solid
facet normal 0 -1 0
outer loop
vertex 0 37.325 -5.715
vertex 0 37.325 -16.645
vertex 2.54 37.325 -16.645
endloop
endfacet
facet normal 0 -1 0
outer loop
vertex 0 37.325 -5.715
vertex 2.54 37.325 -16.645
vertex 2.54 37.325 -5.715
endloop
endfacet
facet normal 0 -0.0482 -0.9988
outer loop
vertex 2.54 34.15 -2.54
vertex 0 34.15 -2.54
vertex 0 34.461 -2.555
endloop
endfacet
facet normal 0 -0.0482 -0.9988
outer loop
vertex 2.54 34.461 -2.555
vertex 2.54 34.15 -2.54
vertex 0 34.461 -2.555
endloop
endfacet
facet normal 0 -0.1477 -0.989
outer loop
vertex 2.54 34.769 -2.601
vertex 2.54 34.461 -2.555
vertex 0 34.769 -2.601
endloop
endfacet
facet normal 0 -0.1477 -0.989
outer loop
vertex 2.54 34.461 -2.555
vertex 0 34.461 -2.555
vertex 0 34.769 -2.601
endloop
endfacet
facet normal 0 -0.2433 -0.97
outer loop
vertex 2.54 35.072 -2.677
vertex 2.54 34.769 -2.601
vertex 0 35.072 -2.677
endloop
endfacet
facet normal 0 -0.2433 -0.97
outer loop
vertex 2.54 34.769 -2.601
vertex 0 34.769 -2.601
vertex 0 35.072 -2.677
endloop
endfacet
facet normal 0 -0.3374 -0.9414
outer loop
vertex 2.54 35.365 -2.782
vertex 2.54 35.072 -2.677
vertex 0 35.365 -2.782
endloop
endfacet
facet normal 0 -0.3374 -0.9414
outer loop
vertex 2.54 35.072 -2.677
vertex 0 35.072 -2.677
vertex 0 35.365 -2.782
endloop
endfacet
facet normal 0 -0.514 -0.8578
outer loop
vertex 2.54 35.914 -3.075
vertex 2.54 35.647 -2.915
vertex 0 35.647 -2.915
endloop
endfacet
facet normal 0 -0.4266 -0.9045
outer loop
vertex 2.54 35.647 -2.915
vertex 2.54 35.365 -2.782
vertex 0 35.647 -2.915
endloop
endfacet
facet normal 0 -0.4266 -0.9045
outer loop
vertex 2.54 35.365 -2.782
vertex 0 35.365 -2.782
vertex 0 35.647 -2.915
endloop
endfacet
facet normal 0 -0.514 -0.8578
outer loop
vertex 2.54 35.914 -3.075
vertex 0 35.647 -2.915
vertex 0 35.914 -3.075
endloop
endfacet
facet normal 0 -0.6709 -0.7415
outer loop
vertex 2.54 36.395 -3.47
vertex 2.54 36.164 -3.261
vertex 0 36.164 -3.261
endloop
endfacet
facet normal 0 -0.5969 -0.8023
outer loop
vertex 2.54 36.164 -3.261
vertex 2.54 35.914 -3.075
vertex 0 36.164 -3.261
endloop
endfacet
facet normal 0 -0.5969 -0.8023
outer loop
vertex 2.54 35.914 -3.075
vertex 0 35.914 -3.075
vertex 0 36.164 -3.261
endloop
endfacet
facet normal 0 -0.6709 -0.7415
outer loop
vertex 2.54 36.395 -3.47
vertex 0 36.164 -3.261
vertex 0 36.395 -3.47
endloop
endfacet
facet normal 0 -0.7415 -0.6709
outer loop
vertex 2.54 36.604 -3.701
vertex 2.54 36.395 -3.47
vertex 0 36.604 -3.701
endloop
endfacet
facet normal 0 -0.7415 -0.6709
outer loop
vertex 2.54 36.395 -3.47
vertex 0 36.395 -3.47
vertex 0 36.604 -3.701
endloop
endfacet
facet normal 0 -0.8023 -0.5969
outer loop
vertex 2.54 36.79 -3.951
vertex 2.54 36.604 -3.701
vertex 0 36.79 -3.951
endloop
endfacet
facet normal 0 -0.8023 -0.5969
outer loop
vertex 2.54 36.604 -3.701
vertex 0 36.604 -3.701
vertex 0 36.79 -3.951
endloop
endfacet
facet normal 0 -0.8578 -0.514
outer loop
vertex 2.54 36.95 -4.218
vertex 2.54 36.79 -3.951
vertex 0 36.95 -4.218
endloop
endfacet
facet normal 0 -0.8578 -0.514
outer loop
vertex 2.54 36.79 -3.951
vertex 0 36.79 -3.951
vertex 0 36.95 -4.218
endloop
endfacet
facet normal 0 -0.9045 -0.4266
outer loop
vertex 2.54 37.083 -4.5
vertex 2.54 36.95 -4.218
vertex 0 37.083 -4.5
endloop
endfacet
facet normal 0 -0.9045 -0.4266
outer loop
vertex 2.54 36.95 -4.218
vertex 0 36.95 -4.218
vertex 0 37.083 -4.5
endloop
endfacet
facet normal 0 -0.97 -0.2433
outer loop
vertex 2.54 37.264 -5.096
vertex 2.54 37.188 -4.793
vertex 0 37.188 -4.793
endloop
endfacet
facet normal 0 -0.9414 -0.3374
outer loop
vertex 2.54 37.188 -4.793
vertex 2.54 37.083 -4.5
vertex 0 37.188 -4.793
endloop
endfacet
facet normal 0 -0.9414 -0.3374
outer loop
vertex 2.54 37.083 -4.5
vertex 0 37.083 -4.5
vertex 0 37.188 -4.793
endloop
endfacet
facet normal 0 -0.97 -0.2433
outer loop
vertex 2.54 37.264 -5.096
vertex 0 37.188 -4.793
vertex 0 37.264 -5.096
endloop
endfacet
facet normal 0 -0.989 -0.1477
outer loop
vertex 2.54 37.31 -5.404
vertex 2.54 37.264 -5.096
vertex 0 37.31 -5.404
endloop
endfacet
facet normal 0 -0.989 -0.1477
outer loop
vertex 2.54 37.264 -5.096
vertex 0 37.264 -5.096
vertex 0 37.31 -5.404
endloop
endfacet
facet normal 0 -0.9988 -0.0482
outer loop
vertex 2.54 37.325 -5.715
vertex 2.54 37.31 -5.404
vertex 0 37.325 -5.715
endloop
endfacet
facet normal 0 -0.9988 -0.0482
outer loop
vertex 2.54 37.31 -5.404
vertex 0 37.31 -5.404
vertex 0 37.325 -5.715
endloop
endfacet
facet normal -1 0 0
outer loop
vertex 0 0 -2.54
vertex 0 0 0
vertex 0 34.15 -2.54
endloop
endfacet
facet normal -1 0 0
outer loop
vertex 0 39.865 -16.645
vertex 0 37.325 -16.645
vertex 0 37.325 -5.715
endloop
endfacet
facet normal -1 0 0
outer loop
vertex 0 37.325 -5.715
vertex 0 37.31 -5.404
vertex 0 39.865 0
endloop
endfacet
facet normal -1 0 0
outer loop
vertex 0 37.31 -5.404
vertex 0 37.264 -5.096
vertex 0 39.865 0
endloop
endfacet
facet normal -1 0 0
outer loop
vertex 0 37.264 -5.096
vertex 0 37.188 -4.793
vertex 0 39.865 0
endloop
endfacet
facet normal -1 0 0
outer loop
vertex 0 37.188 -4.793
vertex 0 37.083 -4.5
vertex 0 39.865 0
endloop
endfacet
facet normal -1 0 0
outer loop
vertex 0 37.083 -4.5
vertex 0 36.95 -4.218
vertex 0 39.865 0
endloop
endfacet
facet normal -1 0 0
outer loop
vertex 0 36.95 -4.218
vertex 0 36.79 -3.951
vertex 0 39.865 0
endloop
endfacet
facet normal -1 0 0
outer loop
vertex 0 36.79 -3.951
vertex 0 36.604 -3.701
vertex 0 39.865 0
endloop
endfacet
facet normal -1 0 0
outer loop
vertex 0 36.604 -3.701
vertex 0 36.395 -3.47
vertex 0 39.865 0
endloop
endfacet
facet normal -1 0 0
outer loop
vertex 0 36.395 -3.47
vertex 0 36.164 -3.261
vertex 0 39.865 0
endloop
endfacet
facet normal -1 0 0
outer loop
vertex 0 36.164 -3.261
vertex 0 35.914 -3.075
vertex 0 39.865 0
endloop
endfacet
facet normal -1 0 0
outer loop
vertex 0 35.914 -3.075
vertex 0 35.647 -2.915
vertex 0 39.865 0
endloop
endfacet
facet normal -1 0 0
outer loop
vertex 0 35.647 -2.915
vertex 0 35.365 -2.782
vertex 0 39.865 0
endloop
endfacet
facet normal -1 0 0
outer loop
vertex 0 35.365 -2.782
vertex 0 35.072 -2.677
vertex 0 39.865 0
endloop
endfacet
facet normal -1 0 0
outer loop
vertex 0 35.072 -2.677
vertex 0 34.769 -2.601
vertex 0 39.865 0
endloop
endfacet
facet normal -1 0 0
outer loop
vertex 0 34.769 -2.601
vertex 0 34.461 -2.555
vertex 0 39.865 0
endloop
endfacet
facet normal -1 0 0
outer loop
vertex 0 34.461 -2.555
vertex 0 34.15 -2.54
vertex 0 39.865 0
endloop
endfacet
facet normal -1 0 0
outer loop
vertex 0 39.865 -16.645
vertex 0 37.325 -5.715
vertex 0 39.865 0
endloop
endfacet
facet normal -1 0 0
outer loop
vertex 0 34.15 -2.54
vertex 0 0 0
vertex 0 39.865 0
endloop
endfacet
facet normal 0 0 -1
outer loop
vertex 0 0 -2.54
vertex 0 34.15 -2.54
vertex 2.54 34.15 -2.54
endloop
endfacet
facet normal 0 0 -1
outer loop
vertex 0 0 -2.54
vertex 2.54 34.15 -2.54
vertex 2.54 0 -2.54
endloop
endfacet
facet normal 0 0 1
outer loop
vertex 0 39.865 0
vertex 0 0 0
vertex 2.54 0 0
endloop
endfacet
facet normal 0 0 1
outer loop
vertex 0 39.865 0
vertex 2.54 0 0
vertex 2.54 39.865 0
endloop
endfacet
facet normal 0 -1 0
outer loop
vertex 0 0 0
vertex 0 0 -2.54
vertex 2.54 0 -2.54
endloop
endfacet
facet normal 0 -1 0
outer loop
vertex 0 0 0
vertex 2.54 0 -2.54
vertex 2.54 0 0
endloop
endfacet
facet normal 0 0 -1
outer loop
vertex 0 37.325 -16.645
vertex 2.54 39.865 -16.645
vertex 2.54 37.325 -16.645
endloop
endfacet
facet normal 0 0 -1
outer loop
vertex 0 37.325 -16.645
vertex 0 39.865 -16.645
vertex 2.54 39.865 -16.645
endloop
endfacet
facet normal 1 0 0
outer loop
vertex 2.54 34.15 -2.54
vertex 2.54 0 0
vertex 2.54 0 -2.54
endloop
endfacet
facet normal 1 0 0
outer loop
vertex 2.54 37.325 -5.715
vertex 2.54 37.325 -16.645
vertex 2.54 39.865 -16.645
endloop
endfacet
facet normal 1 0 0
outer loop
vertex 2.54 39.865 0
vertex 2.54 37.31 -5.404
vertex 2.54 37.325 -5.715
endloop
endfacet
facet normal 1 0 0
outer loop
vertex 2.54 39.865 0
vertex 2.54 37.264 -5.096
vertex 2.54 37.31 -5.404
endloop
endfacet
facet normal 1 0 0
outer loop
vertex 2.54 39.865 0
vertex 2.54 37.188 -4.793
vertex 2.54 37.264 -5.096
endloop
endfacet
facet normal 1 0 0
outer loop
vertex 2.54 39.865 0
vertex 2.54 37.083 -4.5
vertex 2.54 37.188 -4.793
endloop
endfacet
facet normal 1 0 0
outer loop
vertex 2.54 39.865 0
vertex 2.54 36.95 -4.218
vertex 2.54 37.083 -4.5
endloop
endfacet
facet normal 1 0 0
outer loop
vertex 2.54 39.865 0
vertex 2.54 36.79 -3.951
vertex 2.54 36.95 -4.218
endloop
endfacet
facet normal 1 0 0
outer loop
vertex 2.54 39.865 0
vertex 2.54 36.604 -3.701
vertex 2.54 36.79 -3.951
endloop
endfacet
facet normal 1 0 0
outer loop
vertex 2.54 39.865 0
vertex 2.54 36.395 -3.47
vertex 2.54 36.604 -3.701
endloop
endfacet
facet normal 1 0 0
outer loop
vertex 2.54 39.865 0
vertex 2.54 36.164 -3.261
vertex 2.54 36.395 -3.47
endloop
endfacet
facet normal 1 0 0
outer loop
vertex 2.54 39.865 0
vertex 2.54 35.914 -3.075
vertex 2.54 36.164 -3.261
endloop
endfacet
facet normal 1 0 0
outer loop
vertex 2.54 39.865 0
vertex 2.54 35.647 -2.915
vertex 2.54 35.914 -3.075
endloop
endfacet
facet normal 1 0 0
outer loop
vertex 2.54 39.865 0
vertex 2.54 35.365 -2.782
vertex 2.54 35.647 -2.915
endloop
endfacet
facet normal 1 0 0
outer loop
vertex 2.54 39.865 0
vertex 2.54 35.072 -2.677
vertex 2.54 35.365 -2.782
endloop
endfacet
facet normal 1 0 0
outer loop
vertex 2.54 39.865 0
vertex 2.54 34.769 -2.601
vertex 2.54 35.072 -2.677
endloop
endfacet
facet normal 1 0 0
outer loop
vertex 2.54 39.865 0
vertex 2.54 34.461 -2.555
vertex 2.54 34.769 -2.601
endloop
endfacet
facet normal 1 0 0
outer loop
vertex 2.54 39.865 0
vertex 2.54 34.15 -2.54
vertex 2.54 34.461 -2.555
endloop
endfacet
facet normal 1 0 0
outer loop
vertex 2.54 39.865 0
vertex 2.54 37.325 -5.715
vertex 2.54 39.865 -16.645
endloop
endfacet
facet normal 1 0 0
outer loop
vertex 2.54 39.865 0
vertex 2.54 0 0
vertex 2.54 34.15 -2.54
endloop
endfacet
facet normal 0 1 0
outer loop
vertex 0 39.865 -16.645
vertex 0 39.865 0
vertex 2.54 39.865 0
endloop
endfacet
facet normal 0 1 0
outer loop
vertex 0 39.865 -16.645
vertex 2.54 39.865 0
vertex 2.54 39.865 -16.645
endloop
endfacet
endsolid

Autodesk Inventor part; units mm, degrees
ref_plane "YZ Plane" through (0, 0, 0) normal (1, 0, 0) x (0, 1, 0)
ref_plane "XZ Plane" through (0, 0, 0) normal (0, 1, 0) x (-1, 0, 0)
ref_plane "XY Plane" through (0, 0, 0) normal (0, 0, 1) x (1, 0, 0)
sketch "Sketch1" plane through (0, 0, 0) normal (1, 0, 0) x (0, 1, 0)
  line L0 (0, 0) -> (39.8649, 0)
  line L1 (39.8649, 0) -> (39.8649, -16.6447)
  line L2 (39.8649, -16.6447) -> (37.3249, -16.6447)
  line L3 (37.3249, -16.6447) -> (37.3249, -5.715)
  line L4 (34.1499, -2.54) -> (0, -2.54)
  line L5 (0, -2.54) -> (0, 0)
  arc A0 (37.3249, -5.715) -> (34.1499, -2.54) centre (34.1499, -5.715) ccw
  dimension "d0" = 2.54
  dimension "d1" = 3.175
extrude "Extrusion1" add sketch "Sketch1" along normal blind 2.54
properties part number "allen key"
